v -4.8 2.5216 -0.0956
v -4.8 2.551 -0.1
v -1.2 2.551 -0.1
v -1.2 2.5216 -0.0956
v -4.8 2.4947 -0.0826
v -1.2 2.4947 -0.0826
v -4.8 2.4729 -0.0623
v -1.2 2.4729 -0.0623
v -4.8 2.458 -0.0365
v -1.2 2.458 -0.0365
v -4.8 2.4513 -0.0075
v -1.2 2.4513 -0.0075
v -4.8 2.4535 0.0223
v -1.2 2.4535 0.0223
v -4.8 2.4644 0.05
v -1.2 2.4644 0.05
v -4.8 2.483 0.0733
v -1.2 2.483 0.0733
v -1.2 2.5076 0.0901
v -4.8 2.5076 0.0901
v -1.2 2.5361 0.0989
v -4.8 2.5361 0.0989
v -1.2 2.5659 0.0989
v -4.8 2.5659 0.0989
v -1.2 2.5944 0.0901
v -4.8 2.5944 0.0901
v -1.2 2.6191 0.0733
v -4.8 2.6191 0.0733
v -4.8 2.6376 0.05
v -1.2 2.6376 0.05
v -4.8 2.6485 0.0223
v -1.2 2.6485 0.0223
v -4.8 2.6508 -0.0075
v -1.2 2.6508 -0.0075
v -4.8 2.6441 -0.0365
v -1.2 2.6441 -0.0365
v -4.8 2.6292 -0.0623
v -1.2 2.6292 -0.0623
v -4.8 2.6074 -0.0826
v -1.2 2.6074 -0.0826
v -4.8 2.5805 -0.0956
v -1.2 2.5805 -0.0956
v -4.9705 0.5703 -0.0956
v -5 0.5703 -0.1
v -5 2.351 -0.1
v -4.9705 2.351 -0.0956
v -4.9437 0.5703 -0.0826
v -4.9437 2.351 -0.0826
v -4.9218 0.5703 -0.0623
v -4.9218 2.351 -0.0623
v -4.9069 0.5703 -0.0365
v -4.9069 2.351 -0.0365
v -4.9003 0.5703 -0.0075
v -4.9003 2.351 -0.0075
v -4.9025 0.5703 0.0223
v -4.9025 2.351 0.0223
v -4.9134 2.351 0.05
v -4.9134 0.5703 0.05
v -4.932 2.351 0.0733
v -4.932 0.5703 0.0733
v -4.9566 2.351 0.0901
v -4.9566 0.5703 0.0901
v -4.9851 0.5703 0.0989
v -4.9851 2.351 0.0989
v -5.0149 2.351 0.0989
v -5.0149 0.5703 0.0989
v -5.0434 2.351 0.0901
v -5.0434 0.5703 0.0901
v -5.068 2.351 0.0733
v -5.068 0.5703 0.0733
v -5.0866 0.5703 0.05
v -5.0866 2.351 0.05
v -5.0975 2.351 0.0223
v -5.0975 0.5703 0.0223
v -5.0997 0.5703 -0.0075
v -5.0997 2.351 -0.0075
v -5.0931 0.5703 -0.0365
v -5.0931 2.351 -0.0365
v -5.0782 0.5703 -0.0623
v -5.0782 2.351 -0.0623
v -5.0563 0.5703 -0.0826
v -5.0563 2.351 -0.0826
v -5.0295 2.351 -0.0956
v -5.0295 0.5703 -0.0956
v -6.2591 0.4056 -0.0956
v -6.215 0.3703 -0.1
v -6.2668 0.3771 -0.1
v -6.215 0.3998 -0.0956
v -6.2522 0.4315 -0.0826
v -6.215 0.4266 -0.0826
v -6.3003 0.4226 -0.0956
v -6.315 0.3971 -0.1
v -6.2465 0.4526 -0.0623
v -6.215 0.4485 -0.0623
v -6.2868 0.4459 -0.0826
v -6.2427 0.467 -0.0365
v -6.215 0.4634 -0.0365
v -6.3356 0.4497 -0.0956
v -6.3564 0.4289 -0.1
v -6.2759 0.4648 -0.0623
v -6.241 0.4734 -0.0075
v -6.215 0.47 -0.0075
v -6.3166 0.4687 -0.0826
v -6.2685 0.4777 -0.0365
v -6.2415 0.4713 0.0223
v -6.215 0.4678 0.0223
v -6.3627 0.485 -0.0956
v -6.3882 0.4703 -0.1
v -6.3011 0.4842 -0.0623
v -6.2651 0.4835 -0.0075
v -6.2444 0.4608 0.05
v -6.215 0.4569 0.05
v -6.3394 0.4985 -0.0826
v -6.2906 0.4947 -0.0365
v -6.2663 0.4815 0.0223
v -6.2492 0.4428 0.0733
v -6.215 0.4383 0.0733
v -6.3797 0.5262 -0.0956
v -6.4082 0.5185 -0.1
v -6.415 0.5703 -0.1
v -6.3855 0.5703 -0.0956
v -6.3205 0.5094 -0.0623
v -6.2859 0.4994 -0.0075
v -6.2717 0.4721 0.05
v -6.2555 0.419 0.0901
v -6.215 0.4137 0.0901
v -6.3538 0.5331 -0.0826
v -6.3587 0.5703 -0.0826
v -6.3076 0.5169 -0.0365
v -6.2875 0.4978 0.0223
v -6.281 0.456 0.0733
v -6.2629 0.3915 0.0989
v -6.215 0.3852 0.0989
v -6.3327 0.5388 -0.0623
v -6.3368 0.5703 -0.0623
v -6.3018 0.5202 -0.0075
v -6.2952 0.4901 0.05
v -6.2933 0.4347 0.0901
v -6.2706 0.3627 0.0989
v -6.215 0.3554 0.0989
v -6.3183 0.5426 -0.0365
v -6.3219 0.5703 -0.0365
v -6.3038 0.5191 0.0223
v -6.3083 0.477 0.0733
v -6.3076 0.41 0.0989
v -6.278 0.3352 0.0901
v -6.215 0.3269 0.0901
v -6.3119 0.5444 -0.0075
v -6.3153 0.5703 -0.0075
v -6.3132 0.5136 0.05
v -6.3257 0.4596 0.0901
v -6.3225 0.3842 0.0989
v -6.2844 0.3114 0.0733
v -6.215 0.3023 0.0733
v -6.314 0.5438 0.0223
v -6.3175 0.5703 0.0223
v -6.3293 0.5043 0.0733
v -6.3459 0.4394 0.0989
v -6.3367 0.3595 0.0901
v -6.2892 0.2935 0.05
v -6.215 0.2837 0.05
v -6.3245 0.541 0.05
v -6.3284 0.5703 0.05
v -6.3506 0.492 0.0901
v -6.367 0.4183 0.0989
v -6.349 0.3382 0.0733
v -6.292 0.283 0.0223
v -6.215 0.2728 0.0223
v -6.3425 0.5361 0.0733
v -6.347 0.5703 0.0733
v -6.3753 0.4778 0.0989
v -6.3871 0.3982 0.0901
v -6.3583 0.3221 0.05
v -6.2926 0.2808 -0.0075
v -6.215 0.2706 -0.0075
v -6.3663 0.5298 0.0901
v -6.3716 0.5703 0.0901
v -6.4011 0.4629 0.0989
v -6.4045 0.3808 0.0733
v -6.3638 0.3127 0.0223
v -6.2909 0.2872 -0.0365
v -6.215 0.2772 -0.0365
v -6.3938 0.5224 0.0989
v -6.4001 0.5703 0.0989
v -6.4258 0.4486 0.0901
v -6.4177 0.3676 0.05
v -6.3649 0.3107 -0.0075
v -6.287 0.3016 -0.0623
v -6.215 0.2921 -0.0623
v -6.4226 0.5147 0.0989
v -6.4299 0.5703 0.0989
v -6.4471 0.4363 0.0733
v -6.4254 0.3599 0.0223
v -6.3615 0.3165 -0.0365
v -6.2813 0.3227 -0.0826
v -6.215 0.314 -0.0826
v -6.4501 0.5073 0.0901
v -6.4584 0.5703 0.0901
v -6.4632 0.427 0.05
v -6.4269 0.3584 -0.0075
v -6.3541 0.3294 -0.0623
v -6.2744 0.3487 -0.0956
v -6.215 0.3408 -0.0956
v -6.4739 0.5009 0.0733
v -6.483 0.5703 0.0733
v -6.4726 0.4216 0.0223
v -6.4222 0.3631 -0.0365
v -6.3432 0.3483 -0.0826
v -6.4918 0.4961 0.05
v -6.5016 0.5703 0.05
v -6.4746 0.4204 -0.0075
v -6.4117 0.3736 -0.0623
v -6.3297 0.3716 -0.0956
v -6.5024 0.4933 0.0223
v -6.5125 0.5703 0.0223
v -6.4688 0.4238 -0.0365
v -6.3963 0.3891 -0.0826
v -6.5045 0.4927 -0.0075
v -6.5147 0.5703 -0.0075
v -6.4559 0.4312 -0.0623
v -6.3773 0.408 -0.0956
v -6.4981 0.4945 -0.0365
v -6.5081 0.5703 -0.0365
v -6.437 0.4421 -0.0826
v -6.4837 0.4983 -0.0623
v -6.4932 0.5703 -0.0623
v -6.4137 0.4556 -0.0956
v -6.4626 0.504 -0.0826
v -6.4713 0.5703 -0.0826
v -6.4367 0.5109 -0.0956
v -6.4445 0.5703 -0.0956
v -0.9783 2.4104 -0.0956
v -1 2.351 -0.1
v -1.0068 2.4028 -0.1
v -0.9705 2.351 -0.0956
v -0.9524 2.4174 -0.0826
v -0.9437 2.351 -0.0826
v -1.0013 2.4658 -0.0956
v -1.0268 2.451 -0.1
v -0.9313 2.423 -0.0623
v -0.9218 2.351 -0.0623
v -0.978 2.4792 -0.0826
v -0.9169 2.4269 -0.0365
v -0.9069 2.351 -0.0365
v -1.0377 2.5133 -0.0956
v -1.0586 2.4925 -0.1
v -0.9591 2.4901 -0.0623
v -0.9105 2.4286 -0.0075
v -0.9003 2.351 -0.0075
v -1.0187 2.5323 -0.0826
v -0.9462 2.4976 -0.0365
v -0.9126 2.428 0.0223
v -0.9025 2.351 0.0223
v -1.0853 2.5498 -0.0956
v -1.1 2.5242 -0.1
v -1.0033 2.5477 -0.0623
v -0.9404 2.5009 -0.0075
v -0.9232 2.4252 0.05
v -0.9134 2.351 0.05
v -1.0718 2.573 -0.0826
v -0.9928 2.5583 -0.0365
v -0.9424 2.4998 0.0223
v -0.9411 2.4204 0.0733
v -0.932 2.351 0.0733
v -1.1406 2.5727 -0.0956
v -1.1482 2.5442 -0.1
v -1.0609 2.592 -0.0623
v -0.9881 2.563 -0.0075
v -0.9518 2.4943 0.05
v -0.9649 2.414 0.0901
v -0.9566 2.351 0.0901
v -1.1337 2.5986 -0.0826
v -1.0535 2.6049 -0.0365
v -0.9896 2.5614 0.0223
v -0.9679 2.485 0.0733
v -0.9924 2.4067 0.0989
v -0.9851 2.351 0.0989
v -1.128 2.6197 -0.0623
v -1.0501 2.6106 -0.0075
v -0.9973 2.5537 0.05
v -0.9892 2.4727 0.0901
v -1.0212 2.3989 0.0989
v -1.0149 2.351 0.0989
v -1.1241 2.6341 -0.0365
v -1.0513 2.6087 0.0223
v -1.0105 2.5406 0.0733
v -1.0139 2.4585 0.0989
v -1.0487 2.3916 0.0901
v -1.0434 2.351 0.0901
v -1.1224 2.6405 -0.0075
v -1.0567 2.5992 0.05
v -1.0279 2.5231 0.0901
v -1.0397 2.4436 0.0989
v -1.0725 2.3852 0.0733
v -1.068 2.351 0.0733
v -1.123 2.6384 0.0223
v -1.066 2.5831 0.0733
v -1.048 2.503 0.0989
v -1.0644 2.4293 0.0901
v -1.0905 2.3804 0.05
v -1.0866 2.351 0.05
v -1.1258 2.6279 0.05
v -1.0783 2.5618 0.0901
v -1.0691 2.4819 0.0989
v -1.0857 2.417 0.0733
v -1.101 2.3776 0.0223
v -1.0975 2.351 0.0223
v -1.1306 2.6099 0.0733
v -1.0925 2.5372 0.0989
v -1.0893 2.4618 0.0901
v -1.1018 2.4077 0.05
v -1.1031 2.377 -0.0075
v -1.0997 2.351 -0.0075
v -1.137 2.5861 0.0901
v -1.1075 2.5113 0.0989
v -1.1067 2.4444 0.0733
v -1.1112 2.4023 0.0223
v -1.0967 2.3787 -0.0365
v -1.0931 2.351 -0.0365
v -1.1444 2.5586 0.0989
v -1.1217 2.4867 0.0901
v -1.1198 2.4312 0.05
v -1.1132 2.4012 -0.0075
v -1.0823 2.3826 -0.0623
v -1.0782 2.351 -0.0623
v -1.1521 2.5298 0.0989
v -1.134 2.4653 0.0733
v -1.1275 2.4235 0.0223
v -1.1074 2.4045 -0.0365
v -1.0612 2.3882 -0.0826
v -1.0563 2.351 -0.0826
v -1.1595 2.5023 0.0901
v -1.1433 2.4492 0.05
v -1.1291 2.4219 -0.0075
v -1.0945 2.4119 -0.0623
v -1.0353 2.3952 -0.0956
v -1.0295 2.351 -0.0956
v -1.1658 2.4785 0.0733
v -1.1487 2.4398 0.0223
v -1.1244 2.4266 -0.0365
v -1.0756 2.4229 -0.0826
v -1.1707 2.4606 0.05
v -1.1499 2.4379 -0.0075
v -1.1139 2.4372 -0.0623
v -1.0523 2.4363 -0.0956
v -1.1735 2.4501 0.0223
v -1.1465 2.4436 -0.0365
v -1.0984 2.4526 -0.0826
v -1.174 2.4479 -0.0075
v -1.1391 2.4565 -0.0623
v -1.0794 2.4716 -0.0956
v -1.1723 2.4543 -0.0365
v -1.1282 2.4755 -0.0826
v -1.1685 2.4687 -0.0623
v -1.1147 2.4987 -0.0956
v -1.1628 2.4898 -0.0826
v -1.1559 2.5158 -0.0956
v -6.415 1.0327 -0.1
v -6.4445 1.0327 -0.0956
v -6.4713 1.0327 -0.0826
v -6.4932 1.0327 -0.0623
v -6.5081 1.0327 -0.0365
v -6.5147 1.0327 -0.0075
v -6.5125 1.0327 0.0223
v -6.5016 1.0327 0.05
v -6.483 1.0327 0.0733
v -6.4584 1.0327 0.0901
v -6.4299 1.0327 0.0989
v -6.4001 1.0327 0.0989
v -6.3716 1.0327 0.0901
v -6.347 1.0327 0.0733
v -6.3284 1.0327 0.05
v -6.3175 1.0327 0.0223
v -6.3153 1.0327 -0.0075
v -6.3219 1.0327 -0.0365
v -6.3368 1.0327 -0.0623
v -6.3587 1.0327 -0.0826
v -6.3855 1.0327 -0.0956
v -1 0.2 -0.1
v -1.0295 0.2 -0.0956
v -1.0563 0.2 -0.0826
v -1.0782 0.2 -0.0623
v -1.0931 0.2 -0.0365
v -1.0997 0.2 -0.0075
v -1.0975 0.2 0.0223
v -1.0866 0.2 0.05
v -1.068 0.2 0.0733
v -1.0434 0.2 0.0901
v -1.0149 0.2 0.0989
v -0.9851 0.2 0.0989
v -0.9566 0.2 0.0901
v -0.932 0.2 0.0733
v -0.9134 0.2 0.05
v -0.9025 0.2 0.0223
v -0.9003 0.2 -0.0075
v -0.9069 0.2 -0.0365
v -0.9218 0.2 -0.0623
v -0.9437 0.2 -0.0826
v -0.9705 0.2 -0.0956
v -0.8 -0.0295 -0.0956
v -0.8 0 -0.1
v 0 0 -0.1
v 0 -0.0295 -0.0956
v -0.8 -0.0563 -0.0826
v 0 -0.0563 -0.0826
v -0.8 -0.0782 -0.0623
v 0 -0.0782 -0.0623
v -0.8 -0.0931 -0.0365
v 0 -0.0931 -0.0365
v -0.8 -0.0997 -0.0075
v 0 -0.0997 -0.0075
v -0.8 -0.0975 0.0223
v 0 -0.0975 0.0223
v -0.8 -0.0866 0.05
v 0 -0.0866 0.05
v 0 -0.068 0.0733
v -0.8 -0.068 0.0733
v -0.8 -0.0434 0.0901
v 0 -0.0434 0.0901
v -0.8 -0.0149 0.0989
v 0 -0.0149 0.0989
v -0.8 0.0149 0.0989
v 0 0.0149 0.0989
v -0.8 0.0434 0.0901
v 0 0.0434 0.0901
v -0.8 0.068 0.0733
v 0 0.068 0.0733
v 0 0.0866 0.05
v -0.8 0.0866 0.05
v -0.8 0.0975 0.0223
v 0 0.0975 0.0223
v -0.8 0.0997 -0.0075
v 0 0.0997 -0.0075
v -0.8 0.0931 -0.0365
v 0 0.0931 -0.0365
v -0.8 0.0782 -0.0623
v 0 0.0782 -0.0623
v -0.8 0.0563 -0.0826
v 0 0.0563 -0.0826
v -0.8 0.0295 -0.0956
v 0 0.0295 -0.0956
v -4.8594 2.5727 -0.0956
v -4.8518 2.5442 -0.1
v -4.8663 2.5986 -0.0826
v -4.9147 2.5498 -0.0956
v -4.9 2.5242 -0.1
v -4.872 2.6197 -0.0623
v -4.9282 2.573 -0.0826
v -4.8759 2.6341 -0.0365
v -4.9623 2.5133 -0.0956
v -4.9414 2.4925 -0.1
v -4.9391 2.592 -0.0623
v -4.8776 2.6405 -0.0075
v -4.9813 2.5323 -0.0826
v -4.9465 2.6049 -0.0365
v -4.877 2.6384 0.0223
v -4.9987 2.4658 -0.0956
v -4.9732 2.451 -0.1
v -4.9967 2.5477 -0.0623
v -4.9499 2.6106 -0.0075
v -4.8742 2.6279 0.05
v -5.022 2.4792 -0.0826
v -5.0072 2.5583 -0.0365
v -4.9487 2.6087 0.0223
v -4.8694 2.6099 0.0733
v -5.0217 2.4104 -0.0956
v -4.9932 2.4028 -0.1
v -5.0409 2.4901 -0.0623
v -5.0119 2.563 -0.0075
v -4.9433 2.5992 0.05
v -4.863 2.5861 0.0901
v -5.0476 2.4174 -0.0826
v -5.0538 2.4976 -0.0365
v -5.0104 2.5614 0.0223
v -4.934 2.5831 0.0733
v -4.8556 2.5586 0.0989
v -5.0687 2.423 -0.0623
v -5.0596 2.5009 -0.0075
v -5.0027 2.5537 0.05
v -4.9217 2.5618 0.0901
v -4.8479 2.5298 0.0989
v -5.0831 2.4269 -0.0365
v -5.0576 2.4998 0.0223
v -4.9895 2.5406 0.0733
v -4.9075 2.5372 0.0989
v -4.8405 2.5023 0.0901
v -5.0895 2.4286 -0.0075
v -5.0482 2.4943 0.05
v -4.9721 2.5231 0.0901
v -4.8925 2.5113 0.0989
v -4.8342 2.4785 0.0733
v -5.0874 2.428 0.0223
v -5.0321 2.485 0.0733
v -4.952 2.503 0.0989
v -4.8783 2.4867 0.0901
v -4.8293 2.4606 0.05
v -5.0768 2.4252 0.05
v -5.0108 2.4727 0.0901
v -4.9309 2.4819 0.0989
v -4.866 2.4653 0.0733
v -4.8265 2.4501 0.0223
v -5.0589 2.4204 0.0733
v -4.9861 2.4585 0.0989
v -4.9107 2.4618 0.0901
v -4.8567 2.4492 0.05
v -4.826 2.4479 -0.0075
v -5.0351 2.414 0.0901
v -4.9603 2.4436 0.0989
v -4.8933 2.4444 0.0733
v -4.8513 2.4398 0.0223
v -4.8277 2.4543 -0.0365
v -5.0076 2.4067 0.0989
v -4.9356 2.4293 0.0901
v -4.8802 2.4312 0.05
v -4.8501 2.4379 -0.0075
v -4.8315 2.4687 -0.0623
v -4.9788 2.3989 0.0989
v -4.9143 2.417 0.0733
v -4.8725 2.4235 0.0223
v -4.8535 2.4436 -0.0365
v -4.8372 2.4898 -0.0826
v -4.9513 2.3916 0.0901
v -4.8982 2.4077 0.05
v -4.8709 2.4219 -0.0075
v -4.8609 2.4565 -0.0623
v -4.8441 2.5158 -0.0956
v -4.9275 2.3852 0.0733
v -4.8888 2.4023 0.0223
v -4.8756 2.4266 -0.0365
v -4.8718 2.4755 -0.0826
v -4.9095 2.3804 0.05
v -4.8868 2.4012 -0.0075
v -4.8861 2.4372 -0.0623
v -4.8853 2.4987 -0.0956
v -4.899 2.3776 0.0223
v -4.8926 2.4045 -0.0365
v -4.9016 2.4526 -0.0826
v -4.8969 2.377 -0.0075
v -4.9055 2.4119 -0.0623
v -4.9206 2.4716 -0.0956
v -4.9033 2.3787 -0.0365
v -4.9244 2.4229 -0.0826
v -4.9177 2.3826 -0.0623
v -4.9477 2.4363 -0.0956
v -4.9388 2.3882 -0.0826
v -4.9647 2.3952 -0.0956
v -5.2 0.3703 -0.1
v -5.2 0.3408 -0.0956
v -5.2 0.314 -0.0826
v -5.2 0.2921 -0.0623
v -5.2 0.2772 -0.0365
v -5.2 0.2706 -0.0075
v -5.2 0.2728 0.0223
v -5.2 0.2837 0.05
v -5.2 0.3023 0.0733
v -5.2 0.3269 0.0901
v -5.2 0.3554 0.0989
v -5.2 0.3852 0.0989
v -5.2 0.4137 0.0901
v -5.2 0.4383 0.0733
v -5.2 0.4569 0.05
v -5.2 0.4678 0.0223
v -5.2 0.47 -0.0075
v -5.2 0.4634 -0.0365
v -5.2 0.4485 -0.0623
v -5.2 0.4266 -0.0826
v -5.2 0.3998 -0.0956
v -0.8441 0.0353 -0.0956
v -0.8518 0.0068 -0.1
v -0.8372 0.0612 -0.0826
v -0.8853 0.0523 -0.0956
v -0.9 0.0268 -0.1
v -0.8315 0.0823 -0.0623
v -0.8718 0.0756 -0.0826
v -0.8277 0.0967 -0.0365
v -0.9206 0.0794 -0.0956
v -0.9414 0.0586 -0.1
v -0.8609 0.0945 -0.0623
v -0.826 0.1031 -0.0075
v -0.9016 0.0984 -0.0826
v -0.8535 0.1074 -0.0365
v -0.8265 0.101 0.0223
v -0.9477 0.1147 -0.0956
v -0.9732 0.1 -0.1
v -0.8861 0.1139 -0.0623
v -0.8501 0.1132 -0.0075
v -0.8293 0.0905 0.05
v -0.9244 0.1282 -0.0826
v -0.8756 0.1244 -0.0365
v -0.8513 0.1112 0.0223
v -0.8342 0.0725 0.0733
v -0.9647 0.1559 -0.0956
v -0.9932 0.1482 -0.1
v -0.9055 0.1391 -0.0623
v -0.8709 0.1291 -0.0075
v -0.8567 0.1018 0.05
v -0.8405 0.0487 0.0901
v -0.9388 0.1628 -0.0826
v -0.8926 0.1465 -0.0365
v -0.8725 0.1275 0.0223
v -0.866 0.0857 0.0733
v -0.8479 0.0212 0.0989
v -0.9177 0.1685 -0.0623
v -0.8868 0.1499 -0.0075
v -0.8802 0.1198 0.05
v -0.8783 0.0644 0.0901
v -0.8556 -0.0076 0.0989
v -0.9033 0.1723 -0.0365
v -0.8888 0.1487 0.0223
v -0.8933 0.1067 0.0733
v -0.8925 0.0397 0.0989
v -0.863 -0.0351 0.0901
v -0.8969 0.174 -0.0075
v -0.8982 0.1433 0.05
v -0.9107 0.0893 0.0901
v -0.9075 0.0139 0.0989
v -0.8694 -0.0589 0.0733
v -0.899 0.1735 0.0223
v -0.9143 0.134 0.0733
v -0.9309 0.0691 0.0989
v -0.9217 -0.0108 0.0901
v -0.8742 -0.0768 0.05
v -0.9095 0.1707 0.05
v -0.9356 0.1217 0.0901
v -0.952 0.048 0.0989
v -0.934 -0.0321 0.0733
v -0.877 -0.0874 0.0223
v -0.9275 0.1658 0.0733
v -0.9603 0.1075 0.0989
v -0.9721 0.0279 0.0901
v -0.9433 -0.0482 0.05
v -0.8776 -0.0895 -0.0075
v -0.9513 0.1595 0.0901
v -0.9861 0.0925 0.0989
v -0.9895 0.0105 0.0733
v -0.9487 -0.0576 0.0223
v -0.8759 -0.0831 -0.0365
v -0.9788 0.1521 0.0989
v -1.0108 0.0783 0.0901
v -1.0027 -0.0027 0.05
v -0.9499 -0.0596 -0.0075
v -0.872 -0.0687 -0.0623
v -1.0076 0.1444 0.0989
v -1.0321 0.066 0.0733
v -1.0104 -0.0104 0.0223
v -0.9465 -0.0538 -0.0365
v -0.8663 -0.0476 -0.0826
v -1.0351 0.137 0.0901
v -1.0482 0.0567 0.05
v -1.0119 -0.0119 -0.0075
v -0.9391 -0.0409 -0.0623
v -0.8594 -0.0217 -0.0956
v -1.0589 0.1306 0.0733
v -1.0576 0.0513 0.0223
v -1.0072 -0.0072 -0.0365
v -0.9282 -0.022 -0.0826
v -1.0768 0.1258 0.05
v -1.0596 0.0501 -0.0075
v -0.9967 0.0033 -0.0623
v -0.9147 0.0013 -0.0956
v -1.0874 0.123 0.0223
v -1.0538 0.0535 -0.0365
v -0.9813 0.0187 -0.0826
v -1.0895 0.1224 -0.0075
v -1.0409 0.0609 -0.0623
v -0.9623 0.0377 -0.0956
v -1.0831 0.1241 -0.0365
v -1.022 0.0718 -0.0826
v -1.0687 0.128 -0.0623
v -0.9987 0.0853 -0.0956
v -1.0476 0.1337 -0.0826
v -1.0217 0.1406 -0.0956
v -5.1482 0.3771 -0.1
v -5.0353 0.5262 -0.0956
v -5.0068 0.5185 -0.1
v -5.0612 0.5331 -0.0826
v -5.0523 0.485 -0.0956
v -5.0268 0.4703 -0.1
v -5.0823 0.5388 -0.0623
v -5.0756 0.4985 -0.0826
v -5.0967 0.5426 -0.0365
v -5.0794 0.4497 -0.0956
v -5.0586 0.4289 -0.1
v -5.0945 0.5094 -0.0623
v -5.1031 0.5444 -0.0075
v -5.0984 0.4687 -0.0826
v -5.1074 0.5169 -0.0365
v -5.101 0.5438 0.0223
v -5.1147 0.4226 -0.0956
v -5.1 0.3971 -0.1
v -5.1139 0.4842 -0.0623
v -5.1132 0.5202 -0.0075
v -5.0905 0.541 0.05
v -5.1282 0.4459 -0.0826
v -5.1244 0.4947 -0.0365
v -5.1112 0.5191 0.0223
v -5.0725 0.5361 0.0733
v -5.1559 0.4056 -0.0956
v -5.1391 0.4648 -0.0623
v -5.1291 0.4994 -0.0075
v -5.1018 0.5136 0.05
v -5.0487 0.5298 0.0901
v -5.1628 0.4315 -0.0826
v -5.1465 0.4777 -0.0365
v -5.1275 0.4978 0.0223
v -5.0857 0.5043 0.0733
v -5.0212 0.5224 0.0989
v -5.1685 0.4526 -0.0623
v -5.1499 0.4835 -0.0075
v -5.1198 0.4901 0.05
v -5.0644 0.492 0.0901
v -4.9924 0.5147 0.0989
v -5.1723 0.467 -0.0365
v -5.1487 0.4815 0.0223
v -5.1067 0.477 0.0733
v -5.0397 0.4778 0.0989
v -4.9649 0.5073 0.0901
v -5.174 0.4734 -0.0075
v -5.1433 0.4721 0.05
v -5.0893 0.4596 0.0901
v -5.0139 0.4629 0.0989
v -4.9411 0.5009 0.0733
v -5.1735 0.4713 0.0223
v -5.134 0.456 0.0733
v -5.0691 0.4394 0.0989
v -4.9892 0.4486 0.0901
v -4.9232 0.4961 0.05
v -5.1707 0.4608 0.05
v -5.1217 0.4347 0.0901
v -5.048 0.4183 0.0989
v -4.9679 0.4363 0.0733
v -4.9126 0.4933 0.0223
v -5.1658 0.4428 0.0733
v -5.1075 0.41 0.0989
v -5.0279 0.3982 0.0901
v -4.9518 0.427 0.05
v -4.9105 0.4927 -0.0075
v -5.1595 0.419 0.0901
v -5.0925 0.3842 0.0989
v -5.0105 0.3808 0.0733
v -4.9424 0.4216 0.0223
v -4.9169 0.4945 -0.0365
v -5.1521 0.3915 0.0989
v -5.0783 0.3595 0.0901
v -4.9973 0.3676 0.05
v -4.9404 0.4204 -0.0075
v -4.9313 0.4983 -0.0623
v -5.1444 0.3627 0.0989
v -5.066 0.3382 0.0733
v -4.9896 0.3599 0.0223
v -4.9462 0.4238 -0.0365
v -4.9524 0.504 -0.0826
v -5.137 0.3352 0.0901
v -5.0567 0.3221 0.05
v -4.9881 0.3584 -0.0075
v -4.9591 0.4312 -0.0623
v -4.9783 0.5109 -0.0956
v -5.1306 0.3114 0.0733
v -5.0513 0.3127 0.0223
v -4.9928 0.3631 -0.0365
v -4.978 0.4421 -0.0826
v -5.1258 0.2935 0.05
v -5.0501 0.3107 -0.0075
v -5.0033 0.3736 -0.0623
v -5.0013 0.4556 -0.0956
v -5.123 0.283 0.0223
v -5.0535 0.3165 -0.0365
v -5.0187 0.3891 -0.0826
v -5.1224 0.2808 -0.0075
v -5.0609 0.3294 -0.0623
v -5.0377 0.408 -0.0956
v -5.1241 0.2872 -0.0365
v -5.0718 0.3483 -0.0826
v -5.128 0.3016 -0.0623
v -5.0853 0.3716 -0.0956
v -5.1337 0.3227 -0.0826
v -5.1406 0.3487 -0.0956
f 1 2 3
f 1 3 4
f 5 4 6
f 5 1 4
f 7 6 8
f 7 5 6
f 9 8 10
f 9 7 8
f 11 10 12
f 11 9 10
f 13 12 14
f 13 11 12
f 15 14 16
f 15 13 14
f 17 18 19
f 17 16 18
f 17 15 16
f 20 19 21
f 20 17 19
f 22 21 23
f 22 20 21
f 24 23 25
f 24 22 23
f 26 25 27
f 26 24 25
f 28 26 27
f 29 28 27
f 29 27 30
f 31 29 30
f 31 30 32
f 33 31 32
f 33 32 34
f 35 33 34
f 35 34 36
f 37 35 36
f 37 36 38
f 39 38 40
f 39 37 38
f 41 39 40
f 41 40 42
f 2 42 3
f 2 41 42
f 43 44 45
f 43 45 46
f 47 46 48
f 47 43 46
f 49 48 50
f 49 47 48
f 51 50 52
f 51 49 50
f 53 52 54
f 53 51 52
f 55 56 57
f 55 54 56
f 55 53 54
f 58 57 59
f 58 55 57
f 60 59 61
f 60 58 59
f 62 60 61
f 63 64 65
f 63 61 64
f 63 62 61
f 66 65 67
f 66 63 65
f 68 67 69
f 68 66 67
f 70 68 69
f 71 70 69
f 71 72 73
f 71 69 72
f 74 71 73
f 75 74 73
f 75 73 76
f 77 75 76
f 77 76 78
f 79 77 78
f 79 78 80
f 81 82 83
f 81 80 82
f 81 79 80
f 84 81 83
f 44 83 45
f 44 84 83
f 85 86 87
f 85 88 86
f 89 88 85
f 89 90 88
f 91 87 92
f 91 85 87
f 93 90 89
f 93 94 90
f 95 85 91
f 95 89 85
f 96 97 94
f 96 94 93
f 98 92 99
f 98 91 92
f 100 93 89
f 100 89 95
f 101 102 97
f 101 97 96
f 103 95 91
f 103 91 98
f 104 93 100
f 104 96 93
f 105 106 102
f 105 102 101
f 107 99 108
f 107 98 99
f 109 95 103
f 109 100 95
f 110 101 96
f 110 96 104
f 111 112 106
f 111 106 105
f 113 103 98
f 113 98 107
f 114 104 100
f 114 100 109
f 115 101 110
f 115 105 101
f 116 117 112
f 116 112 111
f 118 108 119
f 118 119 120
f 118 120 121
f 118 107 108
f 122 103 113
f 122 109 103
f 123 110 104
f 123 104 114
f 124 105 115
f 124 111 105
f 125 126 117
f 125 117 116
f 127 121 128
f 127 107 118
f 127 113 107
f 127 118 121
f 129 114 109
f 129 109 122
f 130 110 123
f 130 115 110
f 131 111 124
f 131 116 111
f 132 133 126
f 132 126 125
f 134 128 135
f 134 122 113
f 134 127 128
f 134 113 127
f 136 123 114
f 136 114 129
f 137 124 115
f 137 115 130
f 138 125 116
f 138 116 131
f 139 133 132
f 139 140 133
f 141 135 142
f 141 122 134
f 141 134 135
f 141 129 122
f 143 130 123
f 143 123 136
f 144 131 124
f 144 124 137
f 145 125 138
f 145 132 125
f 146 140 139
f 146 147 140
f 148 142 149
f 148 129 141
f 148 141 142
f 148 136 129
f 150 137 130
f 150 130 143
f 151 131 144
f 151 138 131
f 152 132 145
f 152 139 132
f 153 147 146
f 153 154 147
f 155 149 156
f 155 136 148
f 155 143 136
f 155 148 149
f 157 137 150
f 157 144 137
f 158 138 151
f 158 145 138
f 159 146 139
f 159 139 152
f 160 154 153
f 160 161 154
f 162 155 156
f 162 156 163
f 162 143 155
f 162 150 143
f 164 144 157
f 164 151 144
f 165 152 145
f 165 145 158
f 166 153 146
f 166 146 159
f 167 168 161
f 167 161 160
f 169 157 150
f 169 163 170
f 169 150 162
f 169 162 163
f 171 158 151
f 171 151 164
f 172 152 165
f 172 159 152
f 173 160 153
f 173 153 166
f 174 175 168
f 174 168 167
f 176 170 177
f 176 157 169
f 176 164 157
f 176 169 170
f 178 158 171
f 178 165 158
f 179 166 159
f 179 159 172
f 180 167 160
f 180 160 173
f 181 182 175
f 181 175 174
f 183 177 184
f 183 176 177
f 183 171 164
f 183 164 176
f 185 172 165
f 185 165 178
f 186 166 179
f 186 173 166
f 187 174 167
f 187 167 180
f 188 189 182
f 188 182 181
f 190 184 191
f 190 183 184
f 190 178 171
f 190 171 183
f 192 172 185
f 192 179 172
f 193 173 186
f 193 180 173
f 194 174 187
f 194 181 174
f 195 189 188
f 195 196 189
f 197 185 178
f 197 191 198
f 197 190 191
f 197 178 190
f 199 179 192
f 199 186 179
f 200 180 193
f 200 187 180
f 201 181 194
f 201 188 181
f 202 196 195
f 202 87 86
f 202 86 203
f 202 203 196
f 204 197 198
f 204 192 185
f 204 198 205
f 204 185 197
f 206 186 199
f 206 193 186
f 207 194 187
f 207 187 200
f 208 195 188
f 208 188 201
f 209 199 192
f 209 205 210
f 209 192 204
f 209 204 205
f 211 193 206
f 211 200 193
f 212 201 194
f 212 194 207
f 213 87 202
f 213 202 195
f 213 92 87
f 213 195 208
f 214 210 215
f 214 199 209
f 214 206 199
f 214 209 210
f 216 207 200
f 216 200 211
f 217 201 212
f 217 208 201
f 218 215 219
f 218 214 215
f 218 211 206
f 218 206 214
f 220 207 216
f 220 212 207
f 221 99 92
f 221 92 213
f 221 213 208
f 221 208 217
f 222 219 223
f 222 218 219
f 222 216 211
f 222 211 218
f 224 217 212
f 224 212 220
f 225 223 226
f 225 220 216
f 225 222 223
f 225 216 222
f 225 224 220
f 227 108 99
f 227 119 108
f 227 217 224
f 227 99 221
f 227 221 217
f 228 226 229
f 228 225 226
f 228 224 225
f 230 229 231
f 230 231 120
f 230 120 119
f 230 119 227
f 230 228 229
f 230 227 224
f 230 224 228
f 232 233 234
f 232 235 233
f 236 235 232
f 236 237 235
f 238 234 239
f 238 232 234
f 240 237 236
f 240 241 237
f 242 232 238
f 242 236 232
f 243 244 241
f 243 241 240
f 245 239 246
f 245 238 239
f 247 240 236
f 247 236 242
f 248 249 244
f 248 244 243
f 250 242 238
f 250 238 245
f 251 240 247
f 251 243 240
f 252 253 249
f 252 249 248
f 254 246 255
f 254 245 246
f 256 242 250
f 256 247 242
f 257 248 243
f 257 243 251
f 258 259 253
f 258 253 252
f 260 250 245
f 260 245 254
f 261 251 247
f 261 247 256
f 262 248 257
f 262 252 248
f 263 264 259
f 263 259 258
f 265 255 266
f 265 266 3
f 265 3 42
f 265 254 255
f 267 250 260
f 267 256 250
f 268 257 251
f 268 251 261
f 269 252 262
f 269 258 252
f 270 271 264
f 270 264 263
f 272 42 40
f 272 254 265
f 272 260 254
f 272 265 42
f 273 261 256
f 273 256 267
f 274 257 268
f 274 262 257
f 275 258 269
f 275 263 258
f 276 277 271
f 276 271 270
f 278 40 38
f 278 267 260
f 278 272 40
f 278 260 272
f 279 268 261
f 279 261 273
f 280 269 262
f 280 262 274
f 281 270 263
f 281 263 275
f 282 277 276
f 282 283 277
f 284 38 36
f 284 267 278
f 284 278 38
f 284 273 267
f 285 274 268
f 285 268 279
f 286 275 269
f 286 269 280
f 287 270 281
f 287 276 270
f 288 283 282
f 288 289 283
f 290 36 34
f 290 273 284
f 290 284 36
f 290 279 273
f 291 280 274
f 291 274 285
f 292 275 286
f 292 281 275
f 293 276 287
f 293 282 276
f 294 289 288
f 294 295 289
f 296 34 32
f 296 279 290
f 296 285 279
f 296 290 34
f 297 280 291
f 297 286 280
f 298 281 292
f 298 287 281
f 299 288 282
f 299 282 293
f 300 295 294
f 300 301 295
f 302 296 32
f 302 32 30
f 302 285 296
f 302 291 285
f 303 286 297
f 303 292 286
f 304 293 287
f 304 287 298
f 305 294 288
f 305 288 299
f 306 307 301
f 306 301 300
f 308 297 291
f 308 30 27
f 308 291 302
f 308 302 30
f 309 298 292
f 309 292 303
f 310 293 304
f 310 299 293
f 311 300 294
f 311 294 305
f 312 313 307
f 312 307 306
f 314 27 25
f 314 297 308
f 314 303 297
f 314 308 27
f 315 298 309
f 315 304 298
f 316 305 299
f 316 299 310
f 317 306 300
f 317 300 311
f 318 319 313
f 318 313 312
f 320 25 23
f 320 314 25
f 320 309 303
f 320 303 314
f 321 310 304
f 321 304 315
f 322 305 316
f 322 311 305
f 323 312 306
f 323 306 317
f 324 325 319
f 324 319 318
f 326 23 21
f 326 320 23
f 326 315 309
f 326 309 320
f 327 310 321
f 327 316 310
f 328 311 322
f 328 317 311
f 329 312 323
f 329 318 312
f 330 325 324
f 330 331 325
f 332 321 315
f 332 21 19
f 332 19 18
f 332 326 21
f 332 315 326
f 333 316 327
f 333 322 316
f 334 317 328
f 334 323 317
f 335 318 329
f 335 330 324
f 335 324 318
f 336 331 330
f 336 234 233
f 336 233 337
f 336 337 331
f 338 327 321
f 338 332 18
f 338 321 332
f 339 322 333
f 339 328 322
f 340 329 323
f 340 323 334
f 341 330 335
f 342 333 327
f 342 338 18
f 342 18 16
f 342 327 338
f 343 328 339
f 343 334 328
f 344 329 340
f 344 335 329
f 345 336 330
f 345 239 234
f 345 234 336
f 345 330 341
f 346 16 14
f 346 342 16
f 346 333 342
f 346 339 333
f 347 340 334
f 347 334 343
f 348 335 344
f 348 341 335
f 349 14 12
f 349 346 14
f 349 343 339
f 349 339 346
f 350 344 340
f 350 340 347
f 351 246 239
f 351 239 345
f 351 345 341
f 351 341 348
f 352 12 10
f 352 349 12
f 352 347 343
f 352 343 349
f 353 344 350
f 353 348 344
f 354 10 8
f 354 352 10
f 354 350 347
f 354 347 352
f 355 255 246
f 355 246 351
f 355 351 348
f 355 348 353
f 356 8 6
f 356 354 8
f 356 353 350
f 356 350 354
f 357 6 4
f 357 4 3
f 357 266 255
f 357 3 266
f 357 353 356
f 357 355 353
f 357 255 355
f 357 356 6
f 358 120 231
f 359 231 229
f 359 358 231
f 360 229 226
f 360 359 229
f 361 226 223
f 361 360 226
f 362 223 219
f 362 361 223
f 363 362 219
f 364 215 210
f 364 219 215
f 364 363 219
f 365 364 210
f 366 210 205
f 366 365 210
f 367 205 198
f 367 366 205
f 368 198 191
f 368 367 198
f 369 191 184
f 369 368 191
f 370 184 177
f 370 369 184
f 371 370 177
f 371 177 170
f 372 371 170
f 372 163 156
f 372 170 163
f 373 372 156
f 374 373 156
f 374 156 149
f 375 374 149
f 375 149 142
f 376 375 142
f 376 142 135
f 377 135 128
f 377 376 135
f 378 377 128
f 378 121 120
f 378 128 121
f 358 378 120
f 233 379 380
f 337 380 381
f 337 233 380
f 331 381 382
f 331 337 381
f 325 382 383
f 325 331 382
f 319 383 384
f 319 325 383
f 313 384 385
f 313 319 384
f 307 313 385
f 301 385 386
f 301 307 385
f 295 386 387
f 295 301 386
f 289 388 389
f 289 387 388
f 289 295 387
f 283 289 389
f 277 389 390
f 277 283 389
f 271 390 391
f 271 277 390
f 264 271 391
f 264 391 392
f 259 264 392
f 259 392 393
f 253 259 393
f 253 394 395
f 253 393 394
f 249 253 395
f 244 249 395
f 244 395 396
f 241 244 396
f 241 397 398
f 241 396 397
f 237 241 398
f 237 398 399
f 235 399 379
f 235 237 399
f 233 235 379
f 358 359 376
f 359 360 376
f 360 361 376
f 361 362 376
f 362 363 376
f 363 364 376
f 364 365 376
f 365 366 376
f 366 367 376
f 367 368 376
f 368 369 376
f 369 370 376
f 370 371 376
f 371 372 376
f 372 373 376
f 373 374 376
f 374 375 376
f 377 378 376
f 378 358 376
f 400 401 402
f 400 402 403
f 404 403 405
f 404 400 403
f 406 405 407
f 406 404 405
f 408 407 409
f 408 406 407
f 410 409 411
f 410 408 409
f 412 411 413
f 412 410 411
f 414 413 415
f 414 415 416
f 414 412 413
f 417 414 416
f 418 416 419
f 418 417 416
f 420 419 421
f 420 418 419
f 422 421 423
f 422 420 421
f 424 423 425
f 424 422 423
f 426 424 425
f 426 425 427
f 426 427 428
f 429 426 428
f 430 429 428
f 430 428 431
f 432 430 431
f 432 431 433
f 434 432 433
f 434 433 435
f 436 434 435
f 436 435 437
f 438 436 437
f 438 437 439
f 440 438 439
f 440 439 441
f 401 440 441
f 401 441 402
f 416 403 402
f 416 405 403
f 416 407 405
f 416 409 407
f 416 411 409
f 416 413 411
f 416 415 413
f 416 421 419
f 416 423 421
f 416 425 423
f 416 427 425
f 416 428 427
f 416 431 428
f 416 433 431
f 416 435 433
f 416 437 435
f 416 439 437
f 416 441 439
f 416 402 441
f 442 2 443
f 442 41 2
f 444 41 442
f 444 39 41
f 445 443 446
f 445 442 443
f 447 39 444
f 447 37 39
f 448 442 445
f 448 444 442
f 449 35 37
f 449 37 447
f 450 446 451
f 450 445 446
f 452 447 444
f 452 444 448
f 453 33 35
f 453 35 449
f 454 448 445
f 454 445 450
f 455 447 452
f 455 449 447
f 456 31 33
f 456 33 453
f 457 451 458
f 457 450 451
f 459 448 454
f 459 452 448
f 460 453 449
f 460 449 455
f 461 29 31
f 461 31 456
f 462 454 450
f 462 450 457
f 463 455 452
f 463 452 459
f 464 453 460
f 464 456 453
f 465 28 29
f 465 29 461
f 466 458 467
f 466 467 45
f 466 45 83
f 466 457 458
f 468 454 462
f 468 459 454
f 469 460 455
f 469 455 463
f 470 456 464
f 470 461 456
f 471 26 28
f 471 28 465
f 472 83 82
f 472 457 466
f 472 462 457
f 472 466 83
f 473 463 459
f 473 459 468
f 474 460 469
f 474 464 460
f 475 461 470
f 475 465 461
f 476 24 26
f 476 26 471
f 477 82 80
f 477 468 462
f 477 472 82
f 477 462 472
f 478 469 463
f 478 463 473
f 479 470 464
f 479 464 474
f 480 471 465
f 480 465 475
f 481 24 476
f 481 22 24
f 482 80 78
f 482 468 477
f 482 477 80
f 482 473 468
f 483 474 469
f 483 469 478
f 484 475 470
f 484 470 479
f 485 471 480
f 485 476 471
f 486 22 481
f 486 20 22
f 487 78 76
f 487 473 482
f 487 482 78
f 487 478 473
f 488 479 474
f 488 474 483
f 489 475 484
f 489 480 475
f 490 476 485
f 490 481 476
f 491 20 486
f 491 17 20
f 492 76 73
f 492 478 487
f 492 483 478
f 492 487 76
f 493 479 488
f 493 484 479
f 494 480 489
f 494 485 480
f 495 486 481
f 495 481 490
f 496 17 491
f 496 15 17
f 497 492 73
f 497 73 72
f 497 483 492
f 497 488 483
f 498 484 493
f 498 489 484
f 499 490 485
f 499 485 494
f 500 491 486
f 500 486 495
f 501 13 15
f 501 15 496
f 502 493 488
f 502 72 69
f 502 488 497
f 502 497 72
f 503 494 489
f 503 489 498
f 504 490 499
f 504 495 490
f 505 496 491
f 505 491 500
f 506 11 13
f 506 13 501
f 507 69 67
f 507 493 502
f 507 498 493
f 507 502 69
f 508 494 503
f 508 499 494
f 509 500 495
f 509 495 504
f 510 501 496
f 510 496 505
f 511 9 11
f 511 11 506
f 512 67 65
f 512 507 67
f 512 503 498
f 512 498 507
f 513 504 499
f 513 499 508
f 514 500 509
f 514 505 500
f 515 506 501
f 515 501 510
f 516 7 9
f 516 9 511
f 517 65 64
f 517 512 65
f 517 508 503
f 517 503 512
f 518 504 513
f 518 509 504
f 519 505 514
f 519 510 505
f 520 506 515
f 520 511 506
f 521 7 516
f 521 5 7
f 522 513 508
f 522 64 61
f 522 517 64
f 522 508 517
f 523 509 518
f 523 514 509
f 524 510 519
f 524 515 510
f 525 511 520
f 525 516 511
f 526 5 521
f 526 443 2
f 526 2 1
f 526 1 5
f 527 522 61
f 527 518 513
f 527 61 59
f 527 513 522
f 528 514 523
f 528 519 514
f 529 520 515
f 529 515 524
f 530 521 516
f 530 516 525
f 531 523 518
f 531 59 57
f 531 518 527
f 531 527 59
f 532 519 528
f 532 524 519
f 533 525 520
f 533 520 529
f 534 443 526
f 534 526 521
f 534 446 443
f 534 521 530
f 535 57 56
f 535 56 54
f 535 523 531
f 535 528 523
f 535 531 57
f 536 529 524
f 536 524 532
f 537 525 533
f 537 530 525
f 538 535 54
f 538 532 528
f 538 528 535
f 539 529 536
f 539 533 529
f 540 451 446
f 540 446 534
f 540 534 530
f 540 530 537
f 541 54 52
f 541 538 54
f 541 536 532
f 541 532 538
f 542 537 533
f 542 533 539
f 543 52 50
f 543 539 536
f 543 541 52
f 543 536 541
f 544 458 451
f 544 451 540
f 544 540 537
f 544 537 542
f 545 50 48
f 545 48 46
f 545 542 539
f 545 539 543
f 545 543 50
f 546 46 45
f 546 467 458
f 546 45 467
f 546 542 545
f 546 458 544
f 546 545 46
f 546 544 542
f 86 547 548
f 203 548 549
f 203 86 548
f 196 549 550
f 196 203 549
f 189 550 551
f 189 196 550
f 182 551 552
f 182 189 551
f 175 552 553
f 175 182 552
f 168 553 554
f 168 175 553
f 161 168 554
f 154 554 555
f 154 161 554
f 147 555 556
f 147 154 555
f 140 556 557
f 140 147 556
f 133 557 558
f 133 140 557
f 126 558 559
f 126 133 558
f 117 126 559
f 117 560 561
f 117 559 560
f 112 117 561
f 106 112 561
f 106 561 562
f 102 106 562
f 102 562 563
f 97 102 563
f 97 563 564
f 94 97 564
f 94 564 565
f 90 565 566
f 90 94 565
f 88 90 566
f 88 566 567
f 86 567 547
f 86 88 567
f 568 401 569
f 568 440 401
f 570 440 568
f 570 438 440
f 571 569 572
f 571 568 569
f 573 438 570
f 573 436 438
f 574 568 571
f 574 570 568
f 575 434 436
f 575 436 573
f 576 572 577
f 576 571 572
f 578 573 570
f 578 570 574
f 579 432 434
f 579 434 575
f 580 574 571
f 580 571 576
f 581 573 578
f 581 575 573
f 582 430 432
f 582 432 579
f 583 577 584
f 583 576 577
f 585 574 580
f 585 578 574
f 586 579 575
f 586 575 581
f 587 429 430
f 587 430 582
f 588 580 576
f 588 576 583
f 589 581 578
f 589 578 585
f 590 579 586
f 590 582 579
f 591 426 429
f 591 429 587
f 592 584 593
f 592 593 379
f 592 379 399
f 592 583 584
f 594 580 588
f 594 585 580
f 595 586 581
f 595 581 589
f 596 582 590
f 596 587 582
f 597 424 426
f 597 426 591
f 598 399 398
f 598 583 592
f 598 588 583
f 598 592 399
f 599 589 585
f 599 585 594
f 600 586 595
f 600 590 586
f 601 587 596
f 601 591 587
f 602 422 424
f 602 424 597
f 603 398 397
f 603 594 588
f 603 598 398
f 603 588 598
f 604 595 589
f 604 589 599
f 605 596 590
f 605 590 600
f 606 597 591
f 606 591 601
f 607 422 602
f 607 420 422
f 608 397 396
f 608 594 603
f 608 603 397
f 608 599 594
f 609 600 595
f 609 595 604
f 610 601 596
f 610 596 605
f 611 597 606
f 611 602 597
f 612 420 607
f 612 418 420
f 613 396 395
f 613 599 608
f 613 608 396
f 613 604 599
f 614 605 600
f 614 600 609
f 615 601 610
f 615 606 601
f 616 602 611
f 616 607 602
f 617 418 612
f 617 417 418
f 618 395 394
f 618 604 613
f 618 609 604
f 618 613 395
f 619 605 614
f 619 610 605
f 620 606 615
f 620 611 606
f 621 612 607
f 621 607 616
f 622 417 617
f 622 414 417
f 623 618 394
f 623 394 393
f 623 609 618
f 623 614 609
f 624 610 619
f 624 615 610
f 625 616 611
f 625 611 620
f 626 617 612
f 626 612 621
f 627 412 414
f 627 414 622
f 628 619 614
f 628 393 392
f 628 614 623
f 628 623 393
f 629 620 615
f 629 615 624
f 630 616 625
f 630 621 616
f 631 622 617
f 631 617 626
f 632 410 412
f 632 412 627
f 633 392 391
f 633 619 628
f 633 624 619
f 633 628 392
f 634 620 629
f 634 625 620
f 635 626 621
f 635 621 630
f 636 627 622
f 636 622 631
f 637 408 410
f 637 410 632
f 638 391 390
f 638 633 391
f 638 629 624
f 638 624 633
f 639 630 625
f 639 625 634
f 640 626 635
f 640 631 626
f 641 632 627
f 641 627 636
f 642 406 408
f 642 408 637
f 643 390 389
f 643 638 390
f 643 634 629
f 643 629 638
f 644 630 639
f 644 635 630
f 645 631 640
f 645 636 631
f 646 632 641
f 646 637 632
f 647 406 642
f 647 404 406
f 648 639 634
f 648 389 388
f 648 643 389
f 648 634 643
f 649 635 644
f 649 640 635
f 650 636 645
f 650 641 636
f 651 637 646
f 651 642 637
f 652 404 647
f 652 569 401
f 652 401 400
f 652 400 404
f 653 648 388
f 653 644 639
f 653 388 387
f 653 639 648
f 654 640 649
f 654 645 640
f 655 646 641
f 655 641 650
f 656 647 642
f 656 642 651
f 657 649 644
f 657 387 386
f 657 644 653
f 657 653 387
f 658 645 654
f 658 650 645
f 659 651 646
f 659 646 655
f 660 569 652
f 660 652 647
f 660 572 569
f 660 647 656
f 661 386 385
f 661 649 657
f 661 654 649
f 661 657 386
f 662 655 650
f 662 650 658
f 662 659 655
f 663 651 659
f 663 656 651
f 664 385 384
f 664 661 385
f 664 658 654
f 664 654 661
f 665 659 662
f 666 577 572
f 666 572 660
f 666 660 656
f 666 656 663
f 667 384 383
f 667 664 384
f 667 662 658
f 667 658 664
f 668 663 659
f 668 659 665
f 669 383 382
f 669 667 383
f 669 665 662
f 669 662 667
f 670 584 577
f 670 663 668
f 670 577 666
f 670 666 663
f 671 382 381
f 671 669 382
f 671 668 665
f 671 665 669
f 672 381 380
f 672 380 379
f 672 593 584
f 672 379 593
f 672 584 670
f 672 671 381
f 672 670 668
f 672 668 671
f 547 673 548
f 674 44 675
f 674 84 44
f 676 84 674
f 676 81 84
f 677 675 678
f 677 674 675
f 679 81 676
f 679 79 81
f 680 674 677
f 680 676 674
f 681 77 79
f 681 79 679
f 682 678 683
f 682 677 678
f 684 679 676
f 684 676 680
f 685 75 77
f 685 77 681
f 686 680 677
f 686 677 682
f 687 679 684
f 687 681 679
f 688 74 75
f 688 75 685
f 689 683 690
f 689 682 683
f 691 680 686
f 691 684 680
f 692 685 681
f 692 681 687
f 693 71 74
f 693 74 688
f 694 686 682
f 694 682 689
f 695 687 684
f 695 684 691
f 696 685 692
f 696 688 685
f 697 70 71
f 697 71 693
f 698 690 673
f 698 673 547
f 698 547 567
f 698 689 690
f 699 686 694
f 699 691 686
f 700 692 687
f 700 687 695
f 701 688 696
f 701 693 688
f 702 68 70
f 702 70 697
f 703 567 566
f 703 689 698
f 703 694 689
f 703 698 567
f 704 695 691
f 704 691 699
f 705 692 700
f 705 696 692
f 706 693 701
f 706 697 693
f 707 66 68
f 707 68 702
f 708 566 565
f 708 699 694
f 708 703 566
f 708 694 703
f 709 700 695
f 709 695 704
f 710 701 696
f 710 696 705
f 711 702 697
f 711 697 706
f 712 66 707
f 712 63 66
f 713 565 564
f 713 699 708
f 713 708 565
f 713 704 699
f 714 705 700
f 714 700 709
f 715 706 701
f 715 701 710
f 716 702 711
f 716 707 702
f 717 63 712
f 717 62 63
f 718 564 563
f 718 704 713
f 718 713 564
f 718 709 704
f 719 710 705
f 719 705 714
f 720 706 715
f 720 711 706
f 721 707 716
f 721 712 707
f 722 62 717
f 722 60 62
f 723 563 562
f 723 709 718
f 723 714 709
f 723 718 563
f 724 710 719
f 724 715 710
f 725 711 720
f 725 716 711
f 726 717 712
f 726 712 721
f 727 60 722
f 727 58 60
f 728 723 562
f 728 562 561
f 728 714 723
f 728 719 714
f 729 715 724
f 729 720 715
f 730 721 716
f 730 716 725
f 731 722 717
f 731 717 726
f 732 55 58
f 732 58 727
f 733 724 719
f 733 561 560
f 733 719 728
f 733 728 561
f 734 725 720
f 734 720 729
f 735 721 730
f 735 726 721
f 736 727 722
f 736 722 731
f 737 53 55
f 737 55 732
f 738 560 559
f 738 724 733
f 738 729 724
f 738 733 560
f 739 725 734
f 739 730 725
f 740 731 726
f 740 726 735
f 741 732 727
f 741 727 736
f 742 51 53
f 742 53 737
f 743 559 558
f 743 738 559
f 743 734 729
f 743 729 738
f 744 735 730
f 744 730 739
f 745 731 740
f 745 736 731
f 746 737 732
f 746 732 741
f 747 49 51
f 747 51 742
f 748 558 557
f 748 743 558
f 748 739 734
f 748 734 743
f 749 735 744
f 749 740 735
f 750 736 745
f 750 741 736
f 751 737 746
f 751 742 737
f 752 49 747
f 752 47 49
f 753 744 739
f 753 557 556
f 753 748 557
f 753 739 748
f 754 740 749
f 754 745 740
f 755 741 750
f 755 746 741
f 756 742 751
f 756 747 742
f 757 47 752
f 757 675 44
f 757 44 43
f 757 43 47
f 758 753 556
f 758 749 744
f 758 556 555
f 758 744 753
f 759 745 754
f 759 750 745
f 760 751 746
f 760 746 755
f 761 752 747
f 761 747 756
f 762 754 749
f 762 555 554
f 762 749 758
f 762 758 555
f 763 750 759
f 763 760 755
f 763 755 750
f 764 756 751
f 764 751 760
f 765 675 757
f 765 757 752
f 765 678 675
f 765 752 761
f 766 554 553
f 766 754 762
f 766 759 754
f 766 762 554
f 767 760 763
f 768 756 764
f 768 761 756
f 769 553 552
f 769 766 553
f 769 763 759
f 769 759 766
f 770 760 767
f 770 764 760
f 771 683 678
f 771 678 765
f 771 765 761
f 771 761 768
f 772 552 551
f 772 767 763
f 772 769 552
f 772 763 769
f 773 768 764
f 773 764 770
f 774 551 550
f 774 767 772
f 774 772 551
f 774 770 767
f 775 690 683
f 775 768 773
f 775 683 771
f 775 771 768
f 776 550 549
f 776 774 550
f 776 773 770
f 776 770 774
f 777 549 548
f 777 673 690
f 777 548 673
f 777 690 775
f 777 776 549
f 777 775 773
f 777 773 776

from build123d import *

# Parameters (mm, degrees)
SKETCH2_R = 0.1


with BuildPart() as part:
    # Sweep1: sweep along a curve in space
    with BuildLine() as sweep1_path:
        Line((0, 0, 0), (-0.8, 0, 0))
        ThreePointArc((-0.8, 0, 0), (-0.941421356, 0.058578644, 0), (-1, 0.2, 0))
        Line((-1, 0.2, 0), (-1, 2.35103818, 0))
        ThreePointArc((-1, 2.35103818, 0), (-1.058578644, 2.492459536, 0), (-1.2, 2.55103818, 0))
        Line((-1.2, 2.55103818, 0), (-4.8, 2.55103818, 0))
        ThreePointArc((-4.8, 2.55103818, 0), (-4.941421356, 2.492459536, 0), (-5, 2.35103818, 0))
        Line((-5, 2.35103818, 0), (-5, 0.570308291, 0))
        ThreePointArc((-5, 0.570308291, 0), (-5.058578644, 0.428886934, 0), (-5.2, 0.370308291, 0))
        Line((-5.2, 0.370308291, 0), (-6.215003673, 0.370308291, 0))
        ThreePointArc((-6.215003673, 0.370308291, 0), (-6.356425029, 0.428886934, 0), (-6.415003673, 0.570308291, 0))
        Line((-6.415003673, 0.570308291, 0), (-6.415003673, 1.032684647, 0))
    # Sketch2 → Sweep1 (sweep)
    with BuildSketch(Plane(origin=(0, 0, 0), x_dir=(0, 0, -1), z_dir=(1, 0, 0))):
        Circle(SKETCH2_R)
    sweep(path=sweep1_path.line)


solid = part.part
